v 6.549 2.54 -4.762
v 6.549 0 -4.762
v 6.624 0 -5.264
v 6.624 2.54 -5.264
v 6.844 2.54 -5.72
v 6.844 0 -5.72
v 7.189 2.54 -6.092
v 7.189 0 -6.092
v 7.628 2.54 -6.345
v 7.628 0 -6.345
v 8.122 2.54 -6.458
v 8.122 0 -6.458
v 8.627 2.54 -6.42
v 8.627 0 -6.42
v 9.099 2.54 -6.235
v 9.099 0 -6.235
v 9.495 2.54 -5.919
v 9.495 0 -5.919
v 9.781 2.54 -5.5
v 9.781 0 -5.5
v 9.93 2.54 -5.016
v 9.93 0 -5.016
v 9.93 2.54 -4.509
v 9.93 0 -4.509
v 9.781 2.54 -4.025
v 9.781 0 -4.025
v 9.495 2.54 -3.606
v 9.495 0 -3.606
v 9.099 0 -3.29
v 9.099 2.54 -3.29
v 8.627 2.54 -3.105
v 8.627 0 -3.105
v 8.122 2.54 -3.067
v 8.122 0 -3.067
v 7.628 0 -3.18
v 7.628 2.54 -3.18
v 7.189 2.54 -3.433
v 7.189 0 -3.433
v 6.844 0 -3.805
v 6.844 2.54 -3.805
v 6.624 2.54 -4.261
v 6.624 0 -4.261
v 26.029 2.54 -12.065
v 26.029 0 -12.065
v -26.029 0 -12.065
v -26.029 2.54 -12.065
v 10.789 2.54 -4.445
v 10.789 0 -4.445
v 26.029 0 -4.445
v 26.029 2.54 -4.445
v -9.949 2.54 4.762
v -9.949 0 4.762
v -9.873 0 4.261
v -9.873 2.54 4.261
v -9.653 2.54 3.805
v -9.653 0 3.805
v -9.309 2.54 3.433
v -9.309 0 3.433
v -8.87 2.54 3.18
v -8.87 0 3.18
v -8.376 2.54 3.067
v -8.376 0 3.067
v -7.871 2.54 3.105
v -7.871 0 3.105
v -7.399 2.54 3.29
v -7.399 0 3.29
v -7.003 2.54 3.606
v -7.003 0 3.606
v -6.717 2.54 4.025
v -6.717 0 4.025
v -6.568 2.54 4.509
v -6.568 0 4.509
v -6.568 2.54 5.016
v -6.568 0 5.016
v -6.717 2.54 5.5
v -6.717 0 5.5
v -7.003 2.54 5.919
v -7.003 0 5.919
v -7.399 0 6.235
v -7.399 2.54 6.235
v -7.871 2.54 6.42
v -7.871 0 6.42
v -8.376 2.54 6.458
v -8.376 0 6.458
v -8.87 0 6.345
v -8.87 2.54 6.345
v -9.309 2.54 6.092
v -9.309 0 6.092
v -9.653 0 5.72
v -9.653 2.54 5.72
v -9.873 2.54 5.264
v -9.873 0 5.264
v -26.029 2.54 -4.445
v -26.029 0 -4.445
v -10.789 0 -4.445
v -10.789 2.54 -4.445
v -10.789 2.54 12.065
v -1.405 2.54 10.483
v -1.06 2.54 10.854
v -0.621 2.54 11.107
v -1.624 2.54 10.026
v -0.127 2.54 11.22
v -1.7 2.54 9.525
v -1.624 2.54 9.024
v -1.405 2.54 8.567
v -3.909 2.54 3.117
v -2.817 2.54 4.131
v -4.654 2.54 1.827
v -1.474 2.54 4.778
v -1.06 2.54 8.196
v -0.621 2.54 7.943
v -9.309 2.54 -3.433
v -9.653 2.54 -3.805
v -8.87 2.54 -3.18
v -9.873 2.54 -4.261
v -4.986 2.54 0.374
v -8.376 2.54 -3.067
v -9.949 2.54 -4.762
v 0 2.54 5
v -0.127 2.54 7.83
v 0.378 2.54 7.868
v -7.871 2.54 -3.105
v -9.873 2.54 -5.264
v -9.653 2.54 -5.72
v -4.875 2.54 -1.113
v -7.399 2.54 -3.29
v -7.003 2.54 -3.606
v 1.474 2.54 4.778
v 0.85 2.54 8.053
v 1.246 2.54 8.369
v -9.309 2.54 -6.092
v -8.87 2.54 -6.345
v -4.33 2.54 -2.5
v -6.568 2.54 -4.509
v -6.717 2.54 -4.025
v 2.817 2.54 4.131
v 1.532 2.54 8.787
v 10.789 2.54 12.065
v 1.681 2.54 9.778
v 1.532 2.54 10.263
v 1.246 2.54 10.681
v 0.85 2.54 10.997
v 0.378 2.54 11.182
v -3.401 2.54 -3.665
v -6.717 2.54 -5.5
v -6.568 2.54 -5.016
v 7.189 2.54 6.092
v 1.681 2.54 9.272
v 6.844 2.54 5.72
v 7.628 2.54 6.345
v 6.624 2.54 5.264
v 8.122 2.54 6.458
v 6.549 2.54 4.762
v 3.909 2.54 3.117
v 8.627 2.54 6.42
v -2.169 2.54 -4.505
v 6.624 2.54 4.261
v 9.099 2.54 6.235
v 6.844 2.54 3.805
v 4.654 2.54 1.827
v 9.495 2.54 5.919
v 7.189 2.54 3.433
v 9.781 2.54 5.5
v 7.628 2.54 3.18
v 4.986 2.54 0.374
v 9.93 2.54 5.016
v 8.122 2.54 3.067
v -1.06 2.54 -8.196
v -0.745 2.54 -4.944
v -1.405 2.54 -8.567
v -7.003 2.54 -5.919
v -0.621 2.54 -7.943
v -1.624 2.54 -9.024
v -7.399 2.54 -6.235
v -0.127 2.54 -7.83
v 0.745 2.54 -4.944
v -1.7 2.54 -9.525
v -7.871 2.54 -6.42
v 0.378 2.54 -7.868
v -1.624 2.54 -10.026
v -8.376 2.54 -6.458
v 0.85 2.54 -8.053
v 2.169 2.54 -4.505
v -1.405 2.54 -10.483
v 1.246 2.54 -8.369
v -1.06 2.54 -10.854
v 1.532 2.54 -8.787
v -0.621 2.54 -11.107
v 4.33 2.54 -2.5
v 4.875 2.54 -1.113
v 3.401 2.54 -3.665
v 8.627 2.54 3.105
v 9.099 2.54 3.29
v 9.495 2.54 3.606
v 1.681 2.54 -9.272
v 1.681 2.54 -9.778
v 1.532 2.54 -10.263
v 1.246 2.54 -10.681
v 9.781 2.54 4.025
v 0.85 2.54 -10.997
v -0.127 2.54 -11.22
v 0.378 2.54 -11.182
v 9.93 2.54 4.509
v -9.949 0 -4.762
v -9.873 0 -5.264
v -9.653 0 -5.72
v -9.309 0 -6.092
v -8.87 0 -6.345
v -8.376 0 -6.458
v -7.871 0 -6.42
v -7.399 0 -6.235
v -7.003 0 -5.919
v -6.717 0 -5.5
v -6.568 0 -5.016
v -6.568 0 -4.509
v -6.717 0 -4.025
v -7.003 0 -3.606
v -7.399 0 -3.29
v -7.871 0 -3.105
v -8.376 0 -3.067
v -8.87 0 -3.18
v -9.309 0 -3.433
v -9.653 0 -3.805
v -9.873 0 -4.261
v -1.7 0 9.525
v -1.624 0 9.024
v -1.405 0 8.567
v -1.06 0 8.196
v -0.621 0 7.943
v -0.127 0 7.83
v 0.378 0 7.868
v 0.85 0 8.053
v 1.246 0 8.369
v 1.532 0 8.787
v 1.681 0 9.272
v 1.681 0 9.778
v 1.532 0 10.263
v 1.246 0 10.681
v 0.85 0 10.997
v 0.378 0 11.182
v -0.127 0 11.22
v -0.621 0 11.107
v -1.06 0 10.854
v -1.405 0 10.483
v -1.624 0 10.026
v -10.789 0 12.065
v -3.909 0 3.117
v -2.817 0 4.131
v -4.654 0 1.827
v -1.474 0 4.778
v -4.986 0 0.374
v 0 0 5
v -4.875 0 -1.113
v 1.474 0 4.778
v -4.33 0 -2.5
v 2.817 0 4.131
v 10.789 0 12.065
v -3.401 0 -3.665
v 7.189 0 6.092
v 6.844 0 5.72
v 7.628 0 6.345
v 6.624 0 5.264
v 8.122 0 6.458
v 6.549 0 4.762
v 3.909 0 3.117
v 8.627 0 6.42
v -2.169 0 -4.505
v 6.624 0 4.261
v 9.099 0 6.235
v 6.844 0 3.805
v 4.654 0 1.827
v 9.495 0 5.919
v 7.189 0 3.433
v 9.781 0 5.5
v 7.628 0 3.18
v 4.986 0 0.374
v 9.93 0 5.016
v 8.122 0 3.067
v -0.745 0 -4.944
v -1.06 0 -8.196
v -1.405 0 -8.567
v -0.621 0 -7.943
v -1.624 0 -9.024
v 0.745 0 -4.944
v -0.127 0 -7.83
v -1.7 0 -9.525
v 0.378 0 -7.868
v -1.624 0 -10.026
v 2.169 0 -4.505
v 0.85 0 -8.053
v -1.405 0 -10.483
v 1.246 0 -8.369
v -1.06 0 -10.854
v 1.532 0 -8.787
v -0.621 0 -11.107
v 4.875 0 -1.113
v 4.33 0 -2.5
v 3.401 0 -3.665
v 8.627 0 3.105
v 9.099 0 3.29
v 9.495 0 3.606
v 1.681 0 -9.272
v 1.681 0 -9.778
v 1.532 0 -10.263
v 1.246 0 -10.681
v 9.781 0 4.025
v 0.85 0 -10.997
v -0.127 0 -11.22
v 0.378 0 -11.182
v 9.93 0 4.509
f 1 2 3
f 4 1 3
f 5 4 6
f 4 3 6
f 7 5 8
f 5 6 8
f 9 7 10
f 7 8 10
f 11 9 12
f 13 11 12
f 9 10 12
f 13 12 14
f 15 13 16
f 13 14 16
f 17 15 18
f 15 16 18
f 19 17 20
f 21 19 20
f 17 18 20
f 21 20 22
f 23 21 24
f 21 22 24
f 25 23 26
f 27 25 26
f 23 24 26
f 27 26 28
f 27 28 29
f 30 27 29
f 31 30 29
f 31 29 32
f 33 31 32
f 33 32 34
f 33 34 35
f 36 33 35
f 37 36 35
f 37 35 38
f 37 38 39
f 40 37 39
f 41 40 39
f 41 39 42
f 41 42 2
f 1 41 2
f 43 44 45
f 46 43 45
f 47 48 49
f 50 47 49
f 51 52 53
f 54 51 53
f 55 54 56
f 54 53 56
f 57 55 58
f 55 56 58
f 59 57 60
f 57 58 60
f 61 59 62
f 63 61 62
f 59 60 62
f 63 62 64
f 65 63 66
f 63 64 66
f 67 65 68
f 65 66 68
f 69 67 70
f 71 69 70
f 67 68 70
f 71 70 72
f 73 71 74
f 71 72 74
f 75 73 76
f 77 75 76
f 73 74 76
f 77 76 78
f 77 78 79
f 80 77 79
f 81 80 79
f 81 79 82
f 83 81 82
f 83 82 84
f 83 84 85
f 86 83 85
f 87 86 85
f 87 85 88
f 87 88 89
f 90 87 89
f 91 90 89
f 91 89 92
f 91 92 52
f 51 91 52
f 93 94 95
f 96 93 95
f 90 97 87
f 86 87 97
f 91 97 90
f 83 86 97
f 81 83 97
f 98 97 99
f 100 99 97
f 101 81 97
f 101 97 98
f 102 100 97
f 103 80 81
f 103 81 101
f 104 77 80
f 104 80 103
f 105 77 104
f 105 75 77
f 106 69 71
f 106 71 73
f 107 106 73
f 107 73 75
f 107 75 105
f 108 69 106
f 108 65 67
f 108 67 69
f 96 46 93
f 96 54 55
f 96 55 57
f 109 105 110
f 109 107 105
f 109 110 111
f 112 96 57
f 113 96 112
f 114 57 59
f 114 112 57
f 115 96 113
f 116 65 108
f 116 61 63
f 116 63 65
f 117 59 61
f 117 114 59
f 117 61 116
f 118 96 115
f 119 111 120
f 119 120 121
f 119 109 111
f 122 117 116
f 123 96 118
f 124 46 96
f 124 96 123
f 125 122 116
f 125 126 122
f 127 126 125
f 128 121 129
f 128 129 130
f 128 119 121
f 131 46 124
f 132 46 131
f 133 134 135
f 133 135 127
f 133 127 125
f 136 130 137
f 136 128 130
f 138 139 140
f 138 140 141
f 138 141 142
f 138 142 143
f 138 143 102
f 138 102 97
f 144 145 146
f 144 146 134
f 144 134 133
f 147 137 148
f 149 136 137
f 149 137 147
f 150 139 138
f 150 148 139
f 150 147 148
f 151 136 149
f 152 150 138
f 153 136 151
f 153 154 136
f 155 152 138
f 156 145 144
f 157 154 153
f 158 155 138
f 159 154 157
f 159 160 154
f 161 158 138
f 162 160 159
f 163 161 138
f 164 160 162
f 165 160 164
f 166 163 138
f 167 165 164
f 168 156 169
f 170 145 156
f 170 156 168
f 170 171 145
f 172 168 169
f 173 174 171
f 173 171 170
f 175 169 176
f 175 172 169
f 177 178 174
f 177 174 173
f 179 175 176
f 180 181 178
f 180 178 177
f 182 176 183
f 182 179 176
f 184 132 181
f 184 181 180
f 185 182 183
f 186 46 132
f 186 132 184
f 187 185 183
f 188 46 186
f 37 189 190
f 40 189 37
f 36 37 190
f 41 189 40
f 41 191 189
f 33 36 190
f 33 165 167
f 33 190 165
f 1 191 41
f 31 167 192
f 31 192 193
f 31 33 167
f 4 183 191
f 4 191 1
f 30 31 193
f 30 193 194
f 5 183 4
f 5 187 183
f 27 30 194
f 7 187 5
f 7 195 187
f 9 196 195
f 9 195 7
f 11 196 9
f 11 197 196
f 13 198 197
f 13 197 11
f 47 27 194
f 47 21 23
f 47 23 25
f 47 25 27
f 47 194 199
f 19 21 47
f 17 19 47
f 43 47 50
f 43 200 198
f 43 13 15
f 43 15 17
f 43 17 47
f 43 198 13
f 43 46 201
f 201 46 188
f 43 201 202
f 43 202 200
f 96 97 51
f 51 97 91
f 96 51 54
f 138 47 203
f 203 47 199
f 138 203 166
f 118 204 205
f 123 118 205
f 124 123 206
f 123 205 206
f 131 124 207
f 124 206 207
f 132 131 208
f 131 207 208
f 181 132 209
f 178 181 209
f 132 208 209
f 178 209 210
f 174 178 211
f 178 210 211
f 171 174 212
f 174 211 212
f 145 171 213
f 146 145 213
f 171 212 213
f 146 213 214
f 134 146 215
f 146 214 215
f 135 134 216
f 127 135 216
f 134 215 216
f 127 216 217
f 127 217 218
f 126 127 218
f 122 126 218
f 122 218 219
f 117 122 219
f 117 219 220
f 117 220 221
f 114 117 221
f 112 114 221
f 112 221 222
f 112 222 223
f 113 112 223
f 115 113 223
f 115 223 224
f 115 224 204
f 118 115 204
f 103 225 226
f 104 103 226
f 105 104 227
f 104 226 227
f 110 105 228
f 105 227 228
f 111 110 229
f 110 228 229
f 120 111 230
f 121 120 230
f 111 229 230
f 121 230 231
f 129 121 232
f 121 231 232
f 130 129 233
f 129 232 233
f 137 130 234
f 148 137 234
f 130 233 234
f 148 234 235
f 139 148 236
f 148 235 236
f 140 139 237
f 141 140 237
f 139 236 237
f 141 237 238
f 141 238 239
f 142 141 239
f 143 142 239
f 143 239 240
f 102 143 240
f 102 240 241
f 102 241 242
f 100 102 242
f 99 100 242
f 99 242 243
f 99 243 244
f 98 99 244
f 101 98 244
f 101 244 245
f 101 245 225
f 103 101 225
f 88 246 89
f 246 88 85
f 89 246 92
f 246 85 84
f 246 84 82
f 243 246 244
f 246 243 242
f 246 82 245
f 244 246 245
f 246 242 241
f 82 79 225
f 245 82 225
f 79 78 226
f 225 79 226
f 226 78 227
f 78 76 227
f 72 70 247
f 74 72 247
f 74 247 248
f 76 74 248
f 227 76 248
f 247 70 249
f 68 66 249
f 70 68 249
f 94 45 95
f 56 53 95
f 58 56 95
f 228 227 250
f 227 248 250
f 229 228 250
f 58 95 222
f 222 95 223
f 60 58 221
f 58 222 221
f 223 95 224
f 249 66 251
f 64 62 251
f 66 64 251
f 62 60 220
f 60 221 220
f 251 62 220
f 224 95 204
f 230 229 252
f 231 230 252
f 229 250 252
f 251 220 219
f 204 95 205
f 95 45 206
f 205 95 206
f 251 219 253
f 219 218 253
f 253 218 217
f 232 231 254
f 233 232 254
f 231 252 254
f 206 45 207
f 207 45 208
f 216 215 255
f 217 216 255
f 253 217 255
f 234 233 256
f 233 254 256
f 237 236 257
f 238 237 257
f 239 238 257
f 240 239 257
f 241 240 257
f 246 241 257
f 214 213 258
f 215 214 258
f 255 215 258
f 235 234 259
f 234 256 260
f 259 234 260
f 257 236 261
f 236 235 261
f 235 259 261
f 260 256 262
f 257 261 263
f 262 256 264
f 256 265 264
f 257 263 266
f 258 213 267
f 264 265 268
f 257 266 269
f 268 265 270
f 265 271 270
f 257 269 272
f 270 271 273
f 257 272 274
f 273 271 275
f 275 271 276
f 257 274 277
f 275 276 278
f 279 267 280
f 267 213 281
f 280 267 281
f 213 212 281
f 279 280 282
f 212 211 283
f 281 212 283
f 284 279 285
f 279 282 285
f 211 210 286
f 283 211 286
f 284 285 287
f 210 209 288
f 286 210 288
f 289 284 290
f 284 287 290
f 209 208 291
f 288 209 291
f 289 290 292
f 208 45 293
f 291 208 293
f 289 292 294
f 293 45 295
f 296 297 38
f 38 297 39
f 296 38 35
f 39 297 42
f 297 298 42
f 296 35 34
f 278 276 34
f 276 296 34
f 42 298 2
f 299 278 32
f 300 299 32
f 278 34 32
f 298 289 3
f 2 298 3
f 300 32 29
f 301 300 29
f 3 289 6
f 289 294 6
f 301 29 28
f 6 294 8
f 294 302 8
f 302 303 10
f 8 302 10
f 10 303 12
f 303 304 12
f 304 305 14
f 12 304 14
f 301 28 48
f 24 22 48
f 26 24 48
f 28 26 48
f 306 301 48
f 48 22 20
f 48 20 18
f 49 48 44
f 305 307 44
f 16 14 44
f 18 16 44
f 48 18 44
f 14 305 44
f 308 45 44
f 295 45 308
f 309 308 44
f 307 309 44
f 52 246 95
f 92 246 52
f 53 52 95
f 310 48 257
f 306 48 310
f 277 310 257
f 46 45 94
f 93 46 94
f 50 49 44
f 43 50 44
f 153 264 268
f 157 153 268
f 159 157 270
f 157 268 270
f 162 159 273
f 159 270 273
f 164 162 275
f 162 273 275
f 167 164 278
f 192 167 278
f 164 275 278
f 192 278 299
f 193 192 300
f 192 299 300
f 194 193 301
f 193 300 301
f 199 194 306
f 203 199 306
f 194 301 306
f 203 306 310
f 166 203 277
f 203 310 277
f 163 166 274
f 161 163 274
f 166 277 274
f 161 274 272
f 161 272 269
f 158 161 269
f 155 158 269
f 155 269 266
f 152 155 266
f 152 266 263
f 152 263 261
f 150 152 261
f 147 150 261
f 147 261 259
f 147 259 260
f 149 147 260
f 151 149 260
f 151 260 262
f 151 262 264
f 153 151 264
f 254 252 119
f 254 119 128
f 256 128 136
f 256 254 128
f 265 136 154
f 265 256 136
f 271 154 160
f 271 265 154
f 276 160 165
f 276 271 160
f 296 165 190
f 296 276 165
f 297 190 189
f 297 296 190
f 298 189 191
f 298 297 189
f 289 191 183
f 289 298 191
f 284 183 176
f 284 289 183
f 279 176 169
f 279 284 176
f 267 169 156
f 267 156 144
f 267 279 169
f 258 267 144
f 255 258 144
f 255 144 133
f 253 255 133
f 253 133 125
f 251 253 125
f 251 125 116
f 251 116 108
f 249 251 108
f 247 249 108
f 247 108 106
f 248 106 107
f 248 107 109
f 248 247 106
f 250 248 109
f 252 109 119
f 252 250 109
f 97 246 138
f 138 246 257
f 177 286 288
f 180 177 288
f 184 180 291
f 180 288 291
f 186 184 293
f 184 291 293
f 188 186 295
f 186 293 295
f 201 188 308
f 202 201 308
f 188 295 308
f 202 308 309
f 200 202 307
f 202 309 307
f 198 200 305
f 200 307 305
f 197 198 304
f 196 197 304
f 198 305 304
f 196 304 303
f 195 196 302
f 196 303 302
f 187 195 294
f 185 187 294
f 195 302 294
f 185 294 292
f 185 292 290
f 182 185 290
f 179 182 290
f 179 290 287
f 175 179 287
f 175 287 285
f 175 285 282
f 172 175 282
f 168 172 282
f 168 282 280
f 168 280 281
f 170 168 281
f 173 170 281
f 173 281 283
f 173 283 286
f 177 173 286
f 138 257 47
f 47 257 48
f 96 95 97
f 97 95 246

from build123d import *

# Parameters (mm, degrees)
SKETCH1_R            = 5
BOSS_EXTRUDE1_DEPTH  = 2.54
M3_CLEARANCE_HOLE1_D = 3.4


with BuildPart() as part:
    # Sketch1 → Boss-Extrude1 (new body)
    with BuildSketch(Plane(origin=(0, 0, 0), x_dir=(1, 0, 0), z_dir=(0, 1, 0))):
        Polygon((10.788891971, 4.445), (26.028891971, 4.445), (26.028891971, 12.065), (-26.028891971, 12.065), (-26.028891971, 4.445), (-10.788891971, 4.445), (-10.788891971, -12.065), (10.788891971, -12.065), align=None)
        with Locations(Location((0, 0, 0), (0, 0, 270))):
            Circle(SKETCH1_R, mode=Mode.SUBTRACT)
    extrude(amount=BOSS_EXTRUDE1_DEPTH)

    # M3 Clearance Hole1 (through all)
    with Locations(Plane(origin=(0, 2.54, 0), x_dir=(1, 0, 0), z_dir=(0, 1, 0))):
        with Locations((0, 9.525), (8.248891971, 4.7625), (8.248891971, -4.7625), (0, -9.525), (-8.248891971, -4.7625), (-8.248891971, 4.7625)):
            Hole(M3_CLEARANCE_HOLE1_D / 2)


solid = part.part
